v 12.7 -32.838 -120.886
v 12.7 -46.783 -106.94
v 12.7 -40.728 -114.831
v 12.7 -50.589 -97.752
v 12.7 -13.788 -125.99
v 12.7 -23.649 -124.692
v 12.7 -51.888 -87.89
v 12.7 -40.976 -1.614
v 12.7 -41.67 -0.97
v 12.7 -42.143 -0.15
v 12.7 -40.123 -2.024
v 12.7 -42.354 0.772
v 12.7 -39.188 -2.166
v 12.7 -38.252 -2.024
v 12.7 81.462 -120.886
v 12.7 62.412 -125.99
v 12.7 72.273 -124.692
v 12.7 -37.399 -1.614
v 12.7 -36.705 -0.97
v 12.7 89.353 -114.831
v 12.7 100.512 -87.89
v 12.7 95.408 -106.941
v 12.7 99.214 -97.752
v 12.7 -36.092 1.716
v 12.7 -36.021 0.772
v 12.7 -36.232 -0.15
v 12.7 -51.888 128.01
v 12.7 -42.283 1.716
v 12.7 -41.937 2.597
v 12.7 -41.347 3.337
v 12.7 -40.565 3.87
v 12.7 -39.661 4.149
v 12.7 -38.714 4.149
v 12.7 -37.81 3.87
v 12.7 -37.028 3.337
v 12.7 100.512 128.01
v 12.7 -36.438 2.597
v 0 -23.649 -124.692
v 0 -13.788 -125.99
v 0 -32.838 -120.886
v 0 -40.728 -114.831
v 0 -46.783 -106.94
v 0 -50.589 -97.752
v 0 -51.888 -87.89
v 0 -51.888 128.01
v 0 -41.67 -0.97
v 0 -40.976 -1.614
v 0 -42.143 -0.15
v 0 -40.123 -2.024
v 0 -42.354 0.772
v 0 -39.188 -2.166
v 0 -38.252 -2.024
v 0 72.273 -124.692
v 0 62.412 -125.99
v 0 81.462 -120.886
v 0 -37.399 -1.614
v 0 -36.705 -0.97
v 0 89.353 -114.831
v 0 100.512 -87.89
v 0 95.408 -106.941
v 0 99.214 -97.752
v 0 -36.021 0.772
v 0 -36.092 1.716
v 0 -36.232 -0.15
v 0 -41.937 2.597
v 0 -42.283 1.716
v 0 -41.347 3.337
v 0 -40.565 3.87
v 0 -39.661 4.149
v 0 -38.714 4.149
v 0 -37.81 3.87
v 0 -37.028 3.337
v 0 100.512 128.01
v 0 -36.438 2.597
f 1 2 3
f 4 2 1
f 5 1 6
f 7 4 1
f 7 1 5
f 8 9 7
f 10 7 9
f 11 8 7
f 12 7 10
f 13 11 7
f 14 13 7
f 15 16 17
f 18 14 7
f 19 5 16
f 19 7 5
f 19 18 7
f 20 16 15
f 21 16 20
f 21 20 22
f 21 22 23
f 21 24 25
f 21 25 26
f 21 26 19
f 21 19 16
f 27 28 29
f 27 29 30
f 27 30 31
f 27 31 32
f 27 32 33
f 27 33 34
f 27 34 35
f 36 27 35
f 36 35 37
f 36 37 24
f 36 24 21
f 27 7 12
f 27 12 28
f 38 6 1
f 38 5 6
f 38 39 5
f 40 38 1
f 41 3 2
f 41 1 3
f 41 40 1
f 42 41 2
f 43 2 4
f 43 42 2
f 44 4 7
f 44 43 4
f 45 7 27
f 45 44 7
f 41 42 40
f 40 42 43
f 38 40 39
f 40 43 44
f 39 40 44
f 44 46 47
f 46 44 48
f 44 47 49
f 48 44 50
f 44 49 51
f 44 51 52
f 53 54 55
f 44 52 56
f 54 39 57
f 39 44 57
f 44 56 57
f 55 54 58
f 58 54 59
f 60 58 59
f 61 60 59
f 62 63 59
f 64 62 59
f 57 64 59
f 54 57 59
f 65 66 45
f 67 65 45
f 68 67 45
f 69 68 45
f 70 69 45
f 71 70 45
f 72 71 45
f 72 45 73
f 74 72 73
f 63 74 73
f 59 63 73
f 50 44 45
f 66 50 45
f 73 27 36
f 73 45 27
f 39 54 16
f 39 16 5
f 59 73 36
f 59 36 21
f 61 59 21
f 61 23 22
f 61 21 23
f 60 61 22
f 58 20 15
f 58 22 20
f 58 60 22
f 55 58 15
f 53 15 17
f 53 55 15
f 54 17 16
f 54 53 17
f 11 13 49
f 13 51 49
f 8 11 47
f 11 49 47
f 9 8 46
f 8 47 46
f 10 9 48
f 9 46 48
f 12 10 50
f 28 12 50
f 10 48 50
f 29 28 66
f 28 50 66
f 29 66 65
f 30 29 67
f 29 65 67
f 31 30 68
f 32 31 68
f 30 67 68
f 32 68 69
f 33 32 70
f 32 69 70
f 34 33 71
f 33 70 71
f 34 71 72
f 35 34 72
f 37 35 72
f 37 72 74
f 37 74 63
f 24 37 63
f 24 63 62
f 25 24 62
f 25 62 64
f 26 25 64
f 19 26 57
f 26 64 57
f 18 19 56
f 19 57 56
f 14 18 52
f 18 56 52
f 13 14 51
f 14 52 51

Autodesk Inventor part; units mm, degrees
ref_plane "YZ Plane" through (0, 0, 0) normal (1, 0, 0) x (0, 1, 0)
ref_plane "XZ Plane" through (0, 0, 0) normal (0, 1, 0) x (-1, 0, 0)
ref_plane "XY Plane" through (0, 0, 0) normal (0, 0, 1) x (1, 0, 0)
sketch "Sketch1" plane through (0, 0, 0) normal (1, 0, 0) x (0, 1, 0)
  line L0 (100.5124, 128.0095) -> (100.5124, -87.8905)
  line L1 (62.4124, -125.9905) -> (-13.7876, -125.9905)
  line L2 (-51.8876, -87.8905) -> (-51.8876, 128.0095)
  line L3 (-51.8876, 128.0095) -> (100.5124, 128.0095)
  arc A0 (62.4124, -125.9905) -> (100.5124, -87.8905) centre (62.4124, -87.8905) ccw
  arc A1 (-51.8876, -87.8905) -> (-13.7876, -125.9905) centre (-13.7876, -87.8905) ccw
  point P0 (0, 0)
  point P1 (100.5124, -125.9905)
  dimension "d0" = 254
  dimension "d1" = 152.4
  dimension "d3" = 38.1
extrude "Extrusion1" add sketch "Sketch1" along normal blind 12.7
sketch "Sketch3" plane through (12.7, 0, 0) normal (1, 0, 0) x (0, 0, -1)
  line L0 (125.9905, -13.7876) -> (125.9905, 62.4124) projected
  line L1 (-128.0095, 100.5124) -> (-128.0095, -51.8876) projected
  line L2 (-128.0095, -51.8876) -> (87.8905, -51.8876) projected
  point P0 (0, 0)
  point P1 (-1.0095, -39.1876)
  dimension "d16" = 254
  dimension "d17" = 127
  dimension "d18" = 12.7
hole "Hole2" at (12.7, -39.1876, 1.0095) direction (-1, 0, 0) diameter 6.35 end through all
